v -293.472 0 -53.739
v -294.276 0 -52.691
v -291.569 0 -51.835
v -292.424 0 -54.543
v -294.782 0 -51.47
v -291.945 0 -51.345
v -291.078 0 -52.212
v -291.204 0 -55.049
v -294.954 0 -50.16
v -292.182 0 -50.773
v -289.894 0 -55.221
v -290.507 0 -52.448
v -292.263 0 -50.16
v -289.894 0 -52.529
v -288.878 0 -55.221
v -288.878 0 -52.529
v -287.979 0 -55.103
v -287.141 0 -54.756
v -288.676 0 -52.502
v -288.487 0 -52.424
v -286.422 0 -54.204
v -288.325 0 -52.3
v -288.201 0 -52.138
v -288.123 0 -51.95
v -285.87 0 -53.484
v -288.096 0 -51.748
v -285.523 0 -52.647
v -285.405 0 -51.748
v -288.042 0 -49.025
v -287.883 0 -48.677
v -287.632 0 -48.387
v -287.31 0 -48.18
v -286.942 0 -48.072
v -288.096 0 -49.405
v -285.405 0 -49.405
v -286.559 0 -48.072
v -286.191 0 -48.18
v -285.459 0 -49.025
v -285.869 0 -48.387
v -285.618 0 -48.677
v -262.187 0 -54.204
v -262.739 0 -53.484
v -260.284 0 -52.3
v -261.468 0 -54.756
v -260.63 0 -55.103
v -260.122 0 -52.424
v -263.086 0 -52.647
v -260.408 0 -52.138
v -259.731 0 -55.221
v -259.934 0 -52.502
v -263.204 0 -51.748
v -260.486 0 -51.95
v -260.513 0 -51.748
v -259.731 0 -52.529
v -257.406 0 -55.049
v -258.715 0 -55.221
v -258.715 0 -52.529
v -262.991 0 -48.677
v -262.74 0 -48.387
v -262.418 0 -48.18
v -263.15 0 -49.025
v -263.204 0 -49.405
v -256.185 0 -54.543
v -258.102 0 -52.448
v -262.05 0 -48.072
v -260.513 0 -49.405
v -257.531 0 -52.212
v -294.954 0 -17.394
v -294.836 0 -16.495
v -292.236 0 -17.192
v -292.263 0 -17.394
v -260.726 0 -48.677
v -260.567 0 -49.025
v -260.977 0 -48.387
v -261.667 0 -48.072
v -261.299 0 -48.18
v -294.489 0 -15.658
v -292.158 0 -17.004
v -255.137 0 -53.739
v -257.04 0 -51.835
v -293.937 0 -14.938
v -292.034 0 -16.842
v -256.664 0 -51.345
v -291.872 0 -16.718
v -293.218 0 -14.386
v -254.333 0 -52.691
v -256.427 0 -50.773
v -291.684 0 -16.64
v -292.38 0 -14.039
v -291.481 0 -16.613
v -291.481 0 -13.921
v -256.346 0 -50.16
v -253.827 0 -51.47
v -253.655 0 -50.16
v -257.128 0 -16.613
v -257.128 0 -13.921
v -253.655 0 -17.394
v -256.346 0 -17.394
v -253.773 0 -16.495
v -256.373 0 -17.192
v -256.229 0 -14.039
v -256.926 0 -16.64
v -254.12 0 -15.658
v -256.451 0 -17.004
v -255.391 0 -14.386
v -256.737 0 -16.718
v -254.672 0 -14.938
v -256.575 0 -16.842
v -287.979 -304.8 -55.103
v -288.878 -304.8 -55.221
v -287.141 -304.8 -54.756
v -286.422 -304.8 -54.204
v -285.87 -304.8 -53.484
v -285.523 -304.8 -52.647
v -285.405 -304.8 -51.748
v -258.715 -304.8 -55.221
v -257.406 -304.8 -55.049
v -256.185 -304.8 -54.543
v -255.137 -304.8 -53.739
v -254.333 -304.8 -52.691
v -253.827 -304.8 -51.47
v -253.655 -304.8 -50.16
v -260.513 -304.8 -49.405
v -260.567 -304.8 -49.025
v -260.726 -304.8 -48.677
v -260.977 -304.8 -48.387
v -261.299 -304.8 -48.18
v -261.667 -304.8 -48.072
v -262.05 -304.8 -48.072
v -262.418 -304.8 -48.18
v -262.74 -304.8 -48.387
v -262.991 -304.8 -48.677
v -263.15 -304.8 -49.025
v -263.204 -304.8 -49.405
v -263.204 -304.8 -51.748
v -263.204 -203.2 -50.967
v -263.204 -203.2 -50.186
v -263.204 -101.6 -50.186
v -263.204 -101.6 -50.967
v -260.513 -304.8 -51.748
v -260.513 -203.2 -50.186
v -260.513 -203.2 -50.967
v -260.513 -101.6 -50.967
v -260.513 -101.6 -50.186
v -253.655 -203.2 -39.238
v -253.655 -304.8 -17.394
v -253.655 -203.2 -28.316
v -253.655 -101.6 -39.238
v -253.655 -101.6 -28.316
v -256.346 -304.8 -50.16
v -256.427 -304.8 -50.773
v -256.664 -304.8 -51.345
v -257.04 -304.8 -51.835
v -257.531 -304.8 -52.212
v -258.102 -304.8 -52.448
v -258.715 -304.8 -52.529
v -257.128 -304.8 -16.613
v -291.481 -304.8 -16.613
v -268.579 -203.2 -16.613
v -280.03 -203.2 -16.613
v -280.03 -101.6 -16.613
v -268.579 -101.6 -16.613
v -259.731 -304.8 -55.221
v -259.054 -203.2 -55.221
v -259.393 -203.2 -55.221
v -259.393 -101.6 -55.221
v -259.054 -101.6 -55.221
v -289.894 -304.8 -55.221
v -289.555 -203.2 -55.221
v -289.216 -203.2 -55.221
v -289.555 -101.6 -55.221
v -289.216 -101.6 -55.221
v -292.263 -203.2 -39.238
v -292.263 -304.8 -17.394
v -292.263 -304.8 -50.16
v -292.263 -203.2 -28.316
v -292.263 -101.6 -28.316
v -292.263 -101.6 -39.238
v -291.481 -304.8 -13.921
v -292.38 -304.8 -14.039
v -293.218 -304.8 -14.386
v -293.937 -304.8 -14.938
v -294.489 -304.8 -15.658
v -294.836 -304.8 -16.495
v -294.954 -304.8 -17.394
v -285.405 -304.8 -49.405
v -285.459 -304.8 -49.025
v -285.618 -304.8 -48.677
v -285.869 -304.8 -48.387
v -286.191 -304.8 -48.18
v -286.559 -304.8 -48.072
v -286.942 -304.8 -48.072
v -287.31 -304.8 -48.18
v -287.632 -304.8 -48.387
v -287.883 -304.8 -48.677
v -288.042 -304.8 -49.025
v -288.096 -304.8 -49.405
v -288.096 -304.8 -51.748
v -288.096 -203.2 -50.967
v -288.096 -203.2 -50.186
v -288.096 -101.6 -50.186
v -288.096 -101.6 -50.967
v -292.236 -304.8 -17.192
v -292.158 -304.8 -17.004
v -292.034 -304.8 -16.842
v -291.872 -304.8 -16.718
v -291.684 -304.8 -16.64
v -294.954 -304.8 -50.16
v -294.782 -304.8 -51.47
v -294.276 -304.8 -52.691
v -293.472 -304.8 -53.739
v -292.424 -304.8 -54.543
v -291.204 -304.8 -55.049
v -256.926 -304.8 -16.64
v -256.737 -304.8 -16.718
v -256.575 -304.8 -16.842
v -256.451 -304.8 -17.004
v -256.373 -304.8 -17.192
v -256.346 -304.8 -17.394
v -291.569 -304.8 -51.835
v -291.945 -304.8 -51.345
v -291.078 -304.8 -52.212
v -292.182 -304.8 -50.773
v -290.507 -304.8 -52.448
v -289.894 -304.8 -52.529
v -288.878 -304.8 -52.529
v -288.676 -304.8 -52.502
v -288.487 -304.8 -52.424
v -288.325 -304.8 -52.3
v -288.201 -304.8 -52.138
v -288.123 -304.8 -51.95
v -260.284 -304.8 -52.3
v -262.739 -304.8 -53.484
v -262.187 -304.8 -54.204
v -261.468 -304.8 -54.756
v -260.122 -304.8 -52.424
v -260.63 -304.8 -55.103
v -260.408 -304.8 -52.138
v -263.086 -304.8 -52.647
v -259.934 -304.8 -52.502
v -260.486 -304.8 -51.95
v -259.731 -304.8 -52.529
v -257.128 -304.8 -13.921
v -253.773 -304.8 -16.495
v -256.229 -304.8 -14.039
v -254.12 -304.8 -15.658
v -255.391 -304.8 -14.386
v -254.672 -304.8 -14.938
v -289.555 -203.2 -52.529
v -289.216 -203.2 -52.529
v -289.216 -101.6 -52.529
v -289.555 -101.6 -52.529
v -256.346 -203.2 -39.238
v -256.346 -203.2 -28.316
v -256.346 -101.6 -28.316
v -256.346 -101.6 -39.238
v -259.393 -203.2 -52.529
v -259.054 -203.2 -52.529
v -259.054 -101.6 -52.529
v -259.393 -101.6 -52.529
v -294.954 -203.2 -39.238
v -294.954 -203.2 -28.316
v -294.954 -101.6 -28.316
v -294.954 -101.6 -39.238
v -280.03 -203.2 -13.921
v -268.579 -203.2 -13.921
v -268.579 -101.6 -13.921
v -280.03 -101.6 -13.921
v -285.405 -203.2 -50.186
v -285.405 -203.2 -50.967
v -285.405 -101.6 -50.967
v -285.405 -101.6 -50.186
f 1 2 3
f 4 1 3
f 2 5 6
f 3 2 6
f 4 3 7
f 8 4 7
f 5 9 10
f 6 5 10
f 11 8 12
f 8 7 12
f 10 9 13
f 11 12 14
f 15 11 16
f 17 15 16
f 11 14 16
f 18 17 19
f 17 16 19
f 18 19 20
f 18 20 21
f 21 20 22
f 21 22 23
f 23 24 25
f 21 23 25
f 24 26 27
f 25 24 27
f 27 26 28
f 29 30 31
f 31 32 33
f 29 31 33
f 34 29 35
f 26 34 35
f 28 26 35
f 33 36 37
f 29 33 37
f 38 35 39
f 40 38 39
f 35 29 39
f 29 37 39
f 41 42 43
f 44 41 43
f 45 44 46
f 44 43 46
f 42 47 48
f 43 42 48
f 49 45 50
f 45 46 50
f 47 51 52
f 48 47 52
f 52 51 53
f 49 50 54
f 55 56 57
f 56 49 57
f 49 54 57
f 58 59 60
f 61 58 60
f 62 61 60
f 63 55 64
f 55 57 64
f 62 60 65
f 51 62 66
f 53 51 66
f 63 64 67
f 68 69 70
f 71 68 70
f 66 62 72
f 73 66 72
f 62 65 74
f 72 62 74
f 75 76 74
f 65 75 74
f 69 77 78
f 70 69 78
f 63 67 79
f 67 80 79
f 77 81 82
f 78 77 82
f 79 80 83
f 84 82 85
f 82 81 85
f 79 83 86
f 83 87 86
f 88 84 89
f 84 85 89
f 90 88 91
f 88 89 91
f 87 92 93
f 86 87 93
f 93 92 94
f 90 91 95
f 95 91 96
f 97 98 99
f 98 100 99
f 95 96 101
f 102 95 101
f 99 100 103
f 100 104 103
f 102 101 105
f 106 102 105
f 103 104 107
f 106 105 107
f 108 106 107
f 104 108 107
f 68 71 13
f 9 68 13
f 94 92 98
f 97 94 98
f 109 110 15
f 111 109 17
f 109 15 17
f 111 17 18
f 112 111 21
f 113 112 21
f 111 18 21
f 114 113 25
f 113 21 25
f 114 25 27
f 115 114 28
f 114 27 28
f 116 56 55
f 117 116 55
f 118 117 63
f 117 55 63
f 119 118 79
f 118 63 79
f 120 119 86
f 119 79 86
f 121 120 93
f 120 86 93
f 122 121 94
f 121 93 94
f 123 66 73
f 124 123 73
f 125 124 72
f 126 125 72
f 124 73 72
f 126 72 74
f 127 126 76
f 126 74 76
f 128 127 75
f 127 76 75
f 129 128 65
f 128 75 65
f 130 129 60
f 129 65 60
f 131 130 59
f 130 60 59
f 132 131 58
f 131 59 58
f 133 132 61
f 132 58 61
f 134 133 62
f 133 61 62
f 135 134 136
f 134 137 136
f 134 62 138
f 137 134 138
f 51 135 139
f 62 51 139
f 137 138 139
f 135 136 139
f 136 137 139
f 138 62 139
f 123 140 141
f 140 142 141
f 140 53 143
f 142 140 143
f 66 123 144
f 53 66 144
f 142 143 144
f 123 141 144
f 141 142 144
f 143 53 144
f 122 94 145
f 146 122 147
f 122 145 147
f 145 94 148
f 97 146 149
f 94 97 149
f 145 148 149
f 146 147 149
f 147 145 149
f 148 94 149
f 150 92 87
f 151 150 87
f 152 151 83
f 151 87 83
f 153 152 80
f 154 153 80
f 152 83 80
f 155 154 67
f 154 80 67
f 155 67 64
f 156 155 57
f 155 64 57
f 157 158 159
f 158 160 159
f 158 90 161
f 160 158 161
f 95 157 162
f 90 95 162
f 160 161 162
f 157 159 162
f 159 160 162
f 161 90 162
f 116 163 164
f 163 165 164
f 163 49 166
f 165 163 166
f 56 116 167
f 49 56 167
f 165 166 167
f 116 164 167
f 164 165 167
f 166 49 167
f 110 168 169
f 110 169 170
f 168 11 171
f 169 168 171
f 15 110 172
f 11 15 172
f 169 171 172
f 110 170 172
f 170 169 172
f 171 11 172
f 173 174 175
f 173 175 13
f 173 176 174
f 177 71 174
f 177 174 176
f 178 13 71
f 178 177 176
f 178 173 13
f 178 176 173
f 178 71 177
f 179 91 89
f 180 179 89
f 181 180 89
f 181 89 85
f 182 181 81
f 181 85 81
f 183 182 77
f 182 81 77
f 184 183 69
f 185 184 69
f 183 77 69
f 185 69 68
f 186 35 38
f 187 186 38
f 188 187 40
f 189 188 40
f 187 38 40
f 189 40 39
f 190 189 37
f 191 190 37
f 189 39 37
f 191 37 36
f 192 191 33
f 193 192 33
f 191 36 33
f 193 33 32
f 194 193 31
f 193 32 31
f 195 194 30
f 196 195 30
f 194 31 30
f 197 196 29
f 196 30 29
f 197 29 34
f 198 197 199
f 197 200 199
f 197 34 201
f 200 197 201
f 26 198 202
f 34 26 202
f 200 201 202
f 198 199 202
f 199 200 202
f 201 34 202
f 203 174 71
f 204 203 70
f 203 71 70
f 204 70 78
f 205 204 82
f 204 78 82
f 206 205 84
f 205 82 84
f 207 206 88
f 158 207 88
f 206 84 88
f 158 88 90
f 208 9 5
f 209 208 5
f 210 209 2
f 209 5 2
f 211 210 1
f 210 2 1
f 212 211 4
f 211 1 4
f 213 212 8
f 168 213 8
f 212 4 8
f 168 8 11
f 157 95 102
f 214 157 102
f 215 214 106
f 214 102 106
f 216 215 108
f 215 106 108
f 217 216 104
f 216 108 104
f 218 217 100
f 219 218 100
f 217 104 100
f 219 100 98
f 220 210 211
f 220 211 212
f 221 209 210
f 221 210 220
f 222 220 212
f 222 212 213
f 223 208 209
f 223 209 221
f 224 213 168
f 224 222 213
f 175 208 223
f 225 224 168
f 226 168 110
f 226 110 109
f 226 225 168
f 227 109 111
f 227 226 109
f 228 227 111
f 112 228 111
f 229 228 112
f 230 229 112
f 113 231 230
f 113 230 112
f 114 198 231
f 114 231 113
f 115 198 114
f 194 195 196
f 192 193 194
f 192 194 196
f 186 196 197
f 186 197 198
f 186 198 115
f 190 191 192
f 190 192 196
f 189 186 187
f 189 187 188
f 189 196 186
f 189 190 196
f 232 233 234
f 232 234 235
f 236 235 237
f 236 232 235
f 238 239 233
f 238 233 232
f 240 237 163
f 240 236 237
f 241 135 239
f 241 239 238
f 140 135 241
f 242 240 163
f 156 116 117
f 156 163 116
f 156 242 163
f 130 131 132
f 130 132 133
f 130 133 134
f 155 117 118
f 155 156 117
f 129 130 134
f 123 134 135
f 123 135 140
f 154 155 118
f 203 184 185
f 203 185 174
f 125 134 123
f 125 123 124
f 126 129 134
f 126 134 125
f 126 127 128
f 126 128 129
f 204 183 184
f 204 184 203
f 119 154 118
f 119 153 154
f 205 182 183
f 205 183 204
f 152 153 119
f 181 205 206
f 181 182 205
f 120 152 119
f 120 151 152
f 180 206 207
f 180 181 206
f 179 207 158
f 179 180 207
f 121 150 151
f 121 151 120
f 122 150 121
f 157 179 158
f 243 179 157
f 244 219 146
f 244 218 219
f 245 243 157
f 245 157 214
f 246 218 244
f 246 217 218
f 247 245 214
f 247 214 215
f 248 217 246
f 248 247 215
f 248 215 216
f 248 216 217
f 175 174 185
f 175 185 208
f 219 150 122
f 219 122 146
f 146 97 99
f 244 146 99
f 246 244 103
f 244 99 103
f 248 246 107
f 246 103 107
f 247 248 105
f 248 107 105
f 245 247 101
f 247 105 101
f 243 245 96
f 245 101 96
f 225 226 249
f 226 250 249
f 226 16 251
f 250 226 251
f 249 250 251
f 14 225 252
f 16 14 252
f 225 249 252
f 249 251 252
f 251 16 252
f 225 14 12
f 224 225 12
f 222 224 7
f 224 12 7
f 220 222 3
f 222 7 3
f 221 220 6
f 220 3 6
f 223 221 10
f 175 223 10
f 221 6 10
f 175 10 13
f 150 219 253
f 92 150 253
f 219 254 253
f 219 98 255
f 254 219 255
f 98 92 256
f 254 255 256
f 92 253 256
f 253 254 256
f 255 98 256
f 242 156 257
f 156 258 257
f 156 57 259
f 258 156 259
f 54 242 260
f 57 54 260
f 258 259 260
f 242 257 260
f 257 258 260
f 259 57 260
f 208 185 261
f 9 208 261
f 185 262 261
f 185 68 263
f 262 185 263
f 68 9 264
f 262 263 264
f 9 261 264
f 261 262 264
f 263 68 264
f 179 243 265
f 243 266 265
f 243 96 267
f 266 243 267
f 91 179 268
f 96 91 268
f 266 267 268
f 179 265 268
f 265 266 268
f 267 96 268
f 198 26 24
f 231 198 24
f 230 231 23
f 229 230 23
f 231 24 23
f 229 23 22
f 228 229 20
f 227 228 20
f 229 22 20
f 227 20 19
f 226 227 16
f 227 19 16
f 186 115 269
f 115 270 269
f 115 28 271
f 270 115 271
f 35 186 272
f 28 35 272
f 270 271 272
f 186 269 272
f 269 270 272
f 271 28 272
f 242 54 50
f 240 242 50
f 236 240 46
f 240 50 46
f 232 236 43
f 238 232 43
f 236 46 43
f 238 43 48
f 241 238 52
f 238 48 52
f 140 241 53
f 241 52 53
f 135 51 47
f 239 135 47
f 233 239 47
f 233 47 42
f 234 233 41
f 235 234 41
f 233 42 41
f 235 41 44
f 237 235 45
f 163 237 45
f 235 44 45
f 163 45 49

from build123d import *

# Parameters (mm, degrees)
F1_DEPTH = 304.8


with BuildPart() as f1:
    # F0 (on Front) → F1 (new body)
    with BuildSketch(Plane.XZ):
        with BuildLine():
            ThreePointArc((-258.715298, -55.220959), (-255.136864, -53.738723), (-253.654628, -50.160289))
            add(Edge.make_bspline(
                [(-253.654628, -50.160289), (-253.654628, -46.519622), (-253.654628, -39.238289), (-253.654628, -28.316289), (-253.654628, -21.034956), (-253.654628, -17.394289)],
                knots=[0, 0, 0, 0, 10.922, 21.844, 32.766, 32.766, 32.766, 32.766], degree=3))
            ThreePointArc((-253.654628, -17.394289), (-254.671896, -14.938387), (-257.127798, -13.921119))
            add(Edge.make_bspline(
                [(-257.127798, -13.921119), (-260.944854, -13.921119), (-268.578965, -13.921119), (-280.030132, -13.921119), (-287.664243, -13.921119), (-291.481298, -13.921119)],
                knots=[0, 0, 0, 0, 11.451167, 22.902333, 34.3535, 34.3535, 34.3535, 34.3535], degree=3))
            ThreePointArc((-291.481298, -13.921119), (-293.9372, -14.938387), (-294.954468, -17.394289))
            add(Edge.make_bspline(
                [(-294.954468, -17.394289), (-294.954468, -21.034956), (-294.954468, -28.316289), (-294.954468, -39.238289), (-294.954468, -46.519622), (-294.954468, -50.160289)],
                knots=[0, 0, 0, 0, 10.922, 21.844, 32.766, 32.766, 32.766, 32.766], degree=3))
            ThreePointArc((-294.954468, -50.160289), (-293.472232, -53.738723), (-289.893798, -55.220959))
            add(Edge.make_bspline(
                [(-289.893798, -55.220959), (-289.780909, -55.220959), (-289.555132, -55.220959), (-289.216465, -55.220959), (-288.990687, -55.220959), (-288.877798, -55.220959)],
                knots=[0, 0, 0, 0, 0.338667, 0.677333, 1.016, 1.016, 1.016, 1.016], degree=3))
            ThreePointArc((-288.877798, -55.220959), (-286.421896, -54.203691), (-285.404628, -51.747789))
            add(Edge.make_bspline(
                [(-285.404628, -51.747789), (-285.404628, -51.487439), (-285.404628, -50.966739), (-285.404628, -50.185689), (-285.404628, -49.664989), (-285.404628, -49.404639)],
                knots=[0, 0, 0, 0, 0.78105, 1.5621, 2.34315, 2.34315, 2.34315, 2.34315], degree=3))
            ThreePointArc((-285.404628, -49.404639), (-286.750548, -48.058719), (-288.096468, -49.404639))
            add(Edge.make_bspline(
                [(-288.096468, -49.404639), (-288.096468, -49.664989), (-288.096468, -50.185689), (-288.096468, -50.966739), (-288.096468, -51.487439), (-288.096468, -51.747789)],
                knots=[0, 0, 0, 0, 0.78105, 1.5621, 2.34315, 2.34315, 2.34315, 2.34315], degree=3))
            ThreePointArc((-288.096468, -51.747789), (-288.325315, -52.300273), (-288.877798, -52.529119))
            add(Edge.make_bspline(
                [(-288.877798, -52.529119), (-288.990687, -52.529119), (-289.216465, -52.529119), (-289.555132, -52.529119), (-289.780909, -52.529119), (-289.893798, -52.529119)],
                knots=[0, 0, 0, 0, 0.338667, 0.677333, 1.016, 1.016, 1.016, 1.016], degree=3))
            ThreePointArc((-289.893798, -52.529119), (-291.568814, -51.835305), (-292.262628, -50.160289))
            add(Edge.make_bspline(
                [(-292.262628, -17.394289), (-292.262628, -21.034956), (-292.262628, -28.316289), (-292.262628, -39.238289), (-292.262628, -46.519622), (-292.262628, -50.160289)],
                knots=[0, 0, 0, 0, 10.922, 21.844, 32.766, 32.766, 32.766, 32.766], degree=3))
            ThreePointArc((-292.262628, -17.394289), (-292.033782, -16.841805), (-291.481298, -16.612959))
            add(Edge.make_bspline(
                [(-291.481298, -16.612959), (-287.664243, -16.612959), (-280.030132, -16.612959), (-268.578965, -16.612959), (-260.944854, -16.612959), (-257.127798, -16.612959)],
                knots=[0, 0, 0, 0, 11.451167, 22.902333, 34.3535, 34.3535, 34.3535, 34.3535], degree=3))
            ThreePointArc((-257.127798, -16.612959), (-256.575315, -16.841805), (-256.346468, -17.394289))
            add(Edge.make_bspline(
                [(-256.346468, -17.394289), (-256.346468, -21.034956), (-256.346468, -28.316289), (-256.346468, -39.238289), (-256.346468, -46.519622), (-256.346468, -50.160289)],
                knots=[0, 0, 0, 0, 10.922, 21.844, 32.766, 32.766, 32.766, 32.766], degree=3))
            ThreePointArc((-256.346468, -50.160289), (-257.040283, -51.835305), (-258.715298, -52.529119))
            add(Edge.make_bspline(
                [(-258.715298, -52.529119), (-258.828187, -52.529119), (-259.053965, -52.529119), (-259.392632, -52.529119), (-259.618409, -52.529119), (-259.731298, -52.529119)],
                knots=[0, 0, 0, 0, 0.338667, 0.677333, 1.016, 1.016, 1.016, 1.016], degree=3))
            ThreePointArc((-259.731298, -52.529119), (-260.283782, -52.300273), (-260.512628, -51.747789))
            add(Edge.make_bspline(
                [(-260.512628, -51.747789), (-260.512628, -51.487439), (-260.512628, -50.966739), (-260.512628, -50.185689), (-260.512628, -49.664989), (-260.512628, -49.404639)],
                knots=[0, 0, 0, 0, 0.78105, 1.5621, 2.34315, 2.34315, 2.34315, 2.34315], degree=3))
            ThreePointArc((-260.512628, -49.404639), (-261.858548, -48.058719), (-263.204468, -49.404639))
            add(Edge.make_bspline(
                [(-263.204468, -49.404639), (-263.204468, -49.664989), (-263.204468, -50.185689), (-263.204468, -50.966739), (-263.204468, -51.487439), (-263.204468, -51.747789)],
                knots=[0, 0, 0, 0, 0.78105, 1.5621, 2.34315, 2.34315, 2.34315, 2.34315], degree=3))
            ThreePointArc((-263.204468, -51.747789), (-262.1872, -54.203691), (-259.731298, -55.220959))
            add(Edge.make_bspline(
                [(-259.731298, -55.220959), (-259.618409, -55.220959), (-259.392632, -55.220959), (-259.053965, -55.220959), (-258.828187, -55.220959), (-258.715298, -55.220959)],
                knots=[0, 0, 0, 0, 0.338667, 0.677333, 1.016, 1.016, 1.016, 1.016], degree=3))
        make_face()
    extrude(amount=F1_DEPTH)


solid = f1.part
